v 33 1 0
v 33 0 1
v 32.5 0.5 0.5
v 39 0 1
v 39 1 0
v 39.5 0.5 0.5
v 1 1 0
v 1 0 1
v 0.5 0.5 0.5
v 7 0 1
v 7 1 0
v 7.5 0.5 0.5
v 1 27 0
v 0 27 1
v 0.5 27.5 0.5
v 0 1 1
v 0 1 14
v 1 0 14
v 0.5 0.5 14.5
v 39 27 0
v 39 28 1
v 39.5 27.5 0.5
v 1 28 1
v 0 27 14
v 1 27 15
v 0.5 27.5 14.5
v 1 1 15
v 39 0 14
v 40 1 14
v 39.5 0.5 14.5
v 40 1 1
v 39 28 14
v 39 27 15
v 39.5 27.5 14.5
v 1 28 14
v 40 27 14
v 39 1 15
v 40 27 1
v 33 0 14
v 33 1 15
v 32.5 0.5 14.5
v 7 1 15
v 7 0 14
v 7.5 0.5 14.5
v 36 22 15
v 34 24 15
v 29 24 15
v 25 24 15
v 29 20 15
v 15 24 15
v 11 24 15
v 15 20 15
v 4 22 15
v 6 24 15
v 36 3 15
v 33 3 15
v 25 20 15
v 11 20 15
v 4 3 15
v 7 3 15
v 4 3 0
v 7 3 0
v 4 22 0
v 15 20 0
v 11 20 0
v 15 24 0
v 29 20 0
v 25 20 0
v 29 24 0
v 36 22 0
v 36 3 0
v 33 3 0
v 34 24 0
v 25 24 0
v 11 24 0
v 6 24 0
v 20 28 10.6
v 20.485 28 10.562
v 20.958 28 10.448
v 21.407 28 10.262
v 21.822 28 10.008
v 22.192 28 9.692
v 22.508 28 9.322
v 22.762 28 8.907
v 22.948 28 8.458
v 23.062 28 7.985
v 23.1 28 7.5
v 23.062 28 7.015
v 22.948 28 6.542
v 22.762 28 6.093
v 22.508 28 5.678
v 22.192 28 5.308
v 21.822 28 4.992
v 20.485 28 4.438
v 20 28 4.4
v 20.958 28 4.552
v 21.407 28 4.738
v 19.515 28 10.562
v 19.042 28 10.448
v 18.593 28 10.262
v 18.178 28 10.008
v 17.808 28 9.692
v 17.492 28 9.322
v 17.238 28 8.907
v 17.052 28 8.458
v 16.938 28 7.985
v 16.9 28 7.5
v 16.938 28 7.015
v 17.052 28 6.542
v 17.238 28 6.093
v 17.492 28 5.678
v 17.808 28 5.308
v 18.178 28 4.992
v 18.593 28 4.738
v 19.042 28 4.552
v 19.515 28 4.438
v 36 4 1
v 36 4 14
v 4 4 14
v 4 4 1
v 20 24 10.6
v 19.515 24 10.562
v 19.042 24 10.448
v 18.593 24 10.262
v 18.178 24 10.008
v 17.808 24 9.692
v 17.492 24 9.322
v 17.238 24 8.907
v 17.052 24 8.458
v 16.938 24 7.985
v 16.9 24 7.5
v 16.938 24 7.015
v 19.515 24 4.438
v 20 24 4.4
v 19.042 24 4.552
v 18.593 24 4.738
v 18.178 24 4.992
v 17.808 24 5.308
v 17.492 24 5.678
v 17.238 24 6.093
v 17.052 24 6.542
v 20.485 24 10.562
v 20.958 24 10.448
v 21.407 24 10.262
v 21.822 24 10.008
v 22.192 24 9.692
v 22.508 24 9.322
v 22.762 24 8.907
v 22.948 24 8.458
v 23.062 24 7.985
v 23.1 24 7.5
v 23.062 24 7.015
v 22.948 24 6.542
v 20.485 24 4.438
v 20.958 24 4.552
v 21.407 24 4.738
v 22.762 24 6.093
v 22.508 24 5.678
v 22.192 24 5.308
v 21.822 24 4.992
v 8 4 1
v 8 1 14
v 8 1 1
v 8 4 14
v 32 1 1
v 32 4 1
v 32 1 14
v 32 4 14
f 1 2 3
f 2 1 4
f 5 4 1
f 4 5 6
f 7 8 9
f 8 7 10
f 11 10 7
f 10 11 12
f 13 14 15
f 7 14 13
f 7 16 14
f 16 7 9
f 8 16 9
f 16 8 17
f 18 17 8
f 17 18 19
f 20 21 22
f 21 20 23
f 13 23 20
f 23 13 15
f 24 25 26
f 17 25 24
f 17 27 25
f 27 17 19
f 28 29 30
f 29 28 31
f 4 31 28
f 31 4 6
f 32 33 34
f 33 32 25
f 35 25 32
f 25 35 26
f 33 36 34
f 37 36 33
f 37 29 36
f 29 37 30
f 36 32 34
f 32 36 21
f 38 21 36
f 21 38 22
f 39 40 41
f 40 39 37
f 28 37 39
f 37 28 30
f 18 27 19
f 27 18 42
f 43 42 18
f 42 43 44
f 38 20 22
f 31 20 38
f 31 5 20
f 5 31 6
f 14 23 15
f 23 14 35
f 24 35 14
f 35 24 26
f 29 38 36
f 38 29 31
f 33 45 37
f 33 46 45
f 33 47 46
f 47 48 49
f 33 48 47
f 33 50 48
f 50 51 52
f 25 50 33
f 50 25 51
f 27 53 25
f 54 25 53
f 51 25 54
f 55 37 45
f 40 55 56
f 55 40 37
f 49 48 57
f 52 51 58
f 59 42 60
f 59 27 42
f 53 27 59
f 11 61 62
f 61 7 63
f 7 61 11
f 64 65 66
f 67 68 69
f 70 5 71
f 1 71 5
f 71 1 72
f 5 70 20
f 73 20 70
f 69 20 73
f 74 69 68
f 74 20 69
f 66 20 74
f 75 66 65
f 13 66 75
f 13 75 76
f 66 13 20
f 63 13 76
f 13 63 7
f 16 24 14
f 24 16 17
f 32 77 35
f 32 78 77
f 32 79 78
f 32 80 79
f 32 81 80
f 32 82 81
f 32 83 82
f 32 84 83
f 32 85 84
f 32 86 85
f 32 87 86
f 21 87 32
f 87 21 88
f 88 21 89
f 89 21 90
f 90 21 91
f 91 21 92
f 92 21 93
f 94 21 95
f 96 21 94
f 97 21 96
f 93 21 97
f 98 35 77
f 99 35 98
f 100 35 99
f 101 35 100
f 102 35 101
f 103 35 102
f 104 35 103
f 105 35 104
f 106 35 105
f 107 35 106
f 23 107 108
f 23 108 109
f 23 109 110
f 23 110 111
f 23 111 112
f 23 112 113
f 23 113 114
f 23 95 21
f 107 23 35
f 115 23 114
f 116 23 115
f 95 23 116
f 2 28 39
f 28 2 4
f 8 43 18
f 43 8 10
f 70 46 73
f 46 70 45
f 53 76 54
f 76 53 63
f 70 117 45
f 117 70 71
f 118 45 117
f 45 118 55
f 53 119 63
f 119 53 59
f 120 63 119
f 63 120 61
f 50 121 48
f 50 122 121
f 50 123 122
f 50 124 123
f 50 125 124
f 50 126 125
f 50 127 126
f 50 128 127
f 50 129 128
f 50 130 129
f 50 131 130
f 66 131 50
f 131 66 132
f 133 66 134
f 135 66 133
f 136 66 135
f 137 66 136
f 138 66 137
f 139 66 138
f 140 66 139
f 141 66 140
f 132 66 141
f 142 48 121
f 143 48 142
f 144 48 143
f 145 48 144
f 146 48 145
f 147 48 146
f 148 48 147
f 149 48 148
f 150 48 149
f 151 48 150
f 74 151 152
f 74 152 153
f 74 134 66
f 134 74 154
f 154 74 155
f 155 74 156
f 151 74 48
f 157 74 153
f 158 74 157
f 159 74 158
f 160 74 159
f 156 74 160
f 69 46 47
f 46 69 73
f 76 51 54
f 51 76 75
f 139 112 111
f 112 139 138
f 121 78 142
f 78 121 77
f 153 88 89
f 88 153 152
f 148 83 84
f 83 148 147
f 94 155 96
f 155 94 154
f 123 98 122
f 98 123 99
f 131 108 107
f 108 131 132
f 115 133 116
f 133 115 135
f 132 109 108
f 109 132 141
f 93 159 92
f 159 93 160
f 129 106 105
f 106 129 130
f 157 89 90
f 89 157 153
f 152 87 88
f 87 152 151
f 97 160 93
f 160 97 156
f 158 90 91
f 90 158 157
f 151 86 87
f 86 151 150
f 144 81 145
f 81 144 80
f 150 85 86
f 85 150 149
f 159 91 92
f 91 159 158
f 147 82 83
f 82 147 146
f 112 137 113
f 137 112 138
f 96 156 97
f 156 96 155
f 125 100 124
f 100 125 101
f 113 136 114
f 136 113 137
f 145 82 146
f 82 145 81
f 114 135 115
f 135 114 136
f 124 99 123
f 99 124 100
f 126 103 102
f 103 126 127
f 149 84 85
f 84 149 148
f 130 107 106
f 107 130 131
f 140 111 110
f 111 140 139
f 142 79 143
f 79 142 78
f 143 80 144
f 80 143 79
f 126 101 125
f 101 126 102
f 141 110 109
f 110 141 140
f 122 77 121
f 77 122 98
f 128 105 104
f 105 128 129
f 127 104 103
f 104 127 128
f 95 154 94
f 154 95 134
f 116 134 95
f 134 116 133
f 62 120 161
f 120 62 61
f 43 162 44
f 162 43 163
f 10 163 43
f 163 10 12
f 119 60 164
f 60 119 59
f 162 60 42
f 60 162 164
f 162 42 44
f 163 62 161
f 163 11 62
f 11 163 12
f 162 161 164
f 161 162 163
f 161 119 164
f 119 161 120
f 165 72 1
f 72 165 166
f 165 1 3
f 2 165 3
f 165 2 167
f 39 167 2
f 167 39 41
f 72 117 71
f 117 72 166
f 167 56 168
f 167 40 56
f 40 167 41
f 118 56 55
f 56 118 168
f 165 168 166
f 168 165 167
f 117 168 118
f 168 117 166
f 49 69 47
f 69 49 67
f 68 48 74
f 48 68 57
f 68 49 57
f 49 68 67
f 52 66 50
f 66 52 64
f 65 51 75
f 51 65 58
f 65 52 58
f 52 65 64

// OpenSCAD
width = 32;
depth = 15;
height = 20;

thickness = 4;
screw_d = 6.2;
nut_width = 10;

difference(){
  union(){
	chamferCube([width+2*thickness, height+2*thickness, depth]);
  }
  translate([thickness,-3,-2])chamferCube([width, height+thickness+3, depth+4], ch = 2);
  
  #translate([width/2+thickness,0,depth/2])rotate([-90,0,0])cylinder(d = screw_d, h = depth+3*thickness+2, $fn = 40);
}

chamferCube([thickness*2,thickness,depth],[[1,1,1,1],[1,1,1,1],[1,1,0]]);
translate([width,0,0])chamferCube([thickness*2,thickness,depth],[[1,1,1,1],[1,1,1,1],[1,1,1]]);

translate([width/2+thickness+nut_width/2,height,0])cube([thickness,thickness, depth]);
translate([width/2-nut_width/2,height,0])cube([thickness,thickness, depth]);


module chamferCube(size, chamfers = [undef, undef, undef], ch = 1, ph1 = 1, ph2 = undef, ph3 = undef, ph4 = undef, sizeX = undef, sizeY = undef, sizeZ = undef, chamferHeight = undef, chamferX = undef, chamferY = undef, chamferZ = undef) {
    if(size[0]) {
        chamferCubeImpl(size[0], size[1], size[2], ch, chamfers[0], chamfers[1], chamfers[2]);
    } else {
        // keep backwards compatibility
        size     = (sizeX == undef) ? size : sizeX;
        chamfers = (sizeY == undef) ? chamfers : sizeY;
        ch       = (sizeZ == undef) ? ch : sizeZ;
        ph1      = (chamferHeight == undef) ? ph1 : chamferHeight;
        ph2      = (chamferX == undef) ? ph2 : chamferX;
        ph3      = (chamferY == undef) ? ph3 : chamferY;
        ph4      = (chamferZ == undef) ? ph4 : chamferZ;
        
        chamferCubeImpl(size, chamfers, ch, ph1, ph2, ph3, ph4);
    }
}
    
module chamferCubeImpl(sizeX, sizeY, sizeZ, chamferHeight, chamferX, chamferY, chamferZ) {
    chamferX = (chamferX == undef) ? [1, 1, 1, 1] : chamferX;
    chamferY = (chamferY == undef) ? [1, 1, 1, 1] : chamferY;
    chamferZ = (chamferZ == undef) ? [1, 1, 1, 1] : chamferZ;
    chamferCLength = sqrt(chamferHeight * chamferHeight * 2);

    difference() {
        cube([sizeX, sizeY, sizeZ]);
        for(x = [0 : 3]) {
            chamferSide1 = min(x, 1) - floor(x / 3); // 0 1 1 0
            chamferSide2 = floor(x / 2); // 0 0 1 1
            if(chamferX[x]) {
                translate([-0.1, chamferSide1 * sizeY, -chamferHeight + chamferSide2 * sizeZ])
                rotate([45, 0, 0])
                cube([sizeX + 0.2, chamferCLength, chamferCLength]);
            }
            if(chamferY[x]) {
                translate([-chamferHeight + chamferSide2 * sizeX, -0.1, chamferSide1 * sizeZ])
                rotate([0, 45, 0])
                cube([chamferCLength, sizeY + 0.2, chamferCLength]);
            }
            if(chamferZ[x]) {
                translate([chamferSide1 * sizeX, -chamferHeight + chamferSide2 * sizeY, -0.1])
                rotate([0, 0, 45])
                cube([chamferCLength, chamferCLength, sizeZ + 0.2]);
            }
        }
    }
}
